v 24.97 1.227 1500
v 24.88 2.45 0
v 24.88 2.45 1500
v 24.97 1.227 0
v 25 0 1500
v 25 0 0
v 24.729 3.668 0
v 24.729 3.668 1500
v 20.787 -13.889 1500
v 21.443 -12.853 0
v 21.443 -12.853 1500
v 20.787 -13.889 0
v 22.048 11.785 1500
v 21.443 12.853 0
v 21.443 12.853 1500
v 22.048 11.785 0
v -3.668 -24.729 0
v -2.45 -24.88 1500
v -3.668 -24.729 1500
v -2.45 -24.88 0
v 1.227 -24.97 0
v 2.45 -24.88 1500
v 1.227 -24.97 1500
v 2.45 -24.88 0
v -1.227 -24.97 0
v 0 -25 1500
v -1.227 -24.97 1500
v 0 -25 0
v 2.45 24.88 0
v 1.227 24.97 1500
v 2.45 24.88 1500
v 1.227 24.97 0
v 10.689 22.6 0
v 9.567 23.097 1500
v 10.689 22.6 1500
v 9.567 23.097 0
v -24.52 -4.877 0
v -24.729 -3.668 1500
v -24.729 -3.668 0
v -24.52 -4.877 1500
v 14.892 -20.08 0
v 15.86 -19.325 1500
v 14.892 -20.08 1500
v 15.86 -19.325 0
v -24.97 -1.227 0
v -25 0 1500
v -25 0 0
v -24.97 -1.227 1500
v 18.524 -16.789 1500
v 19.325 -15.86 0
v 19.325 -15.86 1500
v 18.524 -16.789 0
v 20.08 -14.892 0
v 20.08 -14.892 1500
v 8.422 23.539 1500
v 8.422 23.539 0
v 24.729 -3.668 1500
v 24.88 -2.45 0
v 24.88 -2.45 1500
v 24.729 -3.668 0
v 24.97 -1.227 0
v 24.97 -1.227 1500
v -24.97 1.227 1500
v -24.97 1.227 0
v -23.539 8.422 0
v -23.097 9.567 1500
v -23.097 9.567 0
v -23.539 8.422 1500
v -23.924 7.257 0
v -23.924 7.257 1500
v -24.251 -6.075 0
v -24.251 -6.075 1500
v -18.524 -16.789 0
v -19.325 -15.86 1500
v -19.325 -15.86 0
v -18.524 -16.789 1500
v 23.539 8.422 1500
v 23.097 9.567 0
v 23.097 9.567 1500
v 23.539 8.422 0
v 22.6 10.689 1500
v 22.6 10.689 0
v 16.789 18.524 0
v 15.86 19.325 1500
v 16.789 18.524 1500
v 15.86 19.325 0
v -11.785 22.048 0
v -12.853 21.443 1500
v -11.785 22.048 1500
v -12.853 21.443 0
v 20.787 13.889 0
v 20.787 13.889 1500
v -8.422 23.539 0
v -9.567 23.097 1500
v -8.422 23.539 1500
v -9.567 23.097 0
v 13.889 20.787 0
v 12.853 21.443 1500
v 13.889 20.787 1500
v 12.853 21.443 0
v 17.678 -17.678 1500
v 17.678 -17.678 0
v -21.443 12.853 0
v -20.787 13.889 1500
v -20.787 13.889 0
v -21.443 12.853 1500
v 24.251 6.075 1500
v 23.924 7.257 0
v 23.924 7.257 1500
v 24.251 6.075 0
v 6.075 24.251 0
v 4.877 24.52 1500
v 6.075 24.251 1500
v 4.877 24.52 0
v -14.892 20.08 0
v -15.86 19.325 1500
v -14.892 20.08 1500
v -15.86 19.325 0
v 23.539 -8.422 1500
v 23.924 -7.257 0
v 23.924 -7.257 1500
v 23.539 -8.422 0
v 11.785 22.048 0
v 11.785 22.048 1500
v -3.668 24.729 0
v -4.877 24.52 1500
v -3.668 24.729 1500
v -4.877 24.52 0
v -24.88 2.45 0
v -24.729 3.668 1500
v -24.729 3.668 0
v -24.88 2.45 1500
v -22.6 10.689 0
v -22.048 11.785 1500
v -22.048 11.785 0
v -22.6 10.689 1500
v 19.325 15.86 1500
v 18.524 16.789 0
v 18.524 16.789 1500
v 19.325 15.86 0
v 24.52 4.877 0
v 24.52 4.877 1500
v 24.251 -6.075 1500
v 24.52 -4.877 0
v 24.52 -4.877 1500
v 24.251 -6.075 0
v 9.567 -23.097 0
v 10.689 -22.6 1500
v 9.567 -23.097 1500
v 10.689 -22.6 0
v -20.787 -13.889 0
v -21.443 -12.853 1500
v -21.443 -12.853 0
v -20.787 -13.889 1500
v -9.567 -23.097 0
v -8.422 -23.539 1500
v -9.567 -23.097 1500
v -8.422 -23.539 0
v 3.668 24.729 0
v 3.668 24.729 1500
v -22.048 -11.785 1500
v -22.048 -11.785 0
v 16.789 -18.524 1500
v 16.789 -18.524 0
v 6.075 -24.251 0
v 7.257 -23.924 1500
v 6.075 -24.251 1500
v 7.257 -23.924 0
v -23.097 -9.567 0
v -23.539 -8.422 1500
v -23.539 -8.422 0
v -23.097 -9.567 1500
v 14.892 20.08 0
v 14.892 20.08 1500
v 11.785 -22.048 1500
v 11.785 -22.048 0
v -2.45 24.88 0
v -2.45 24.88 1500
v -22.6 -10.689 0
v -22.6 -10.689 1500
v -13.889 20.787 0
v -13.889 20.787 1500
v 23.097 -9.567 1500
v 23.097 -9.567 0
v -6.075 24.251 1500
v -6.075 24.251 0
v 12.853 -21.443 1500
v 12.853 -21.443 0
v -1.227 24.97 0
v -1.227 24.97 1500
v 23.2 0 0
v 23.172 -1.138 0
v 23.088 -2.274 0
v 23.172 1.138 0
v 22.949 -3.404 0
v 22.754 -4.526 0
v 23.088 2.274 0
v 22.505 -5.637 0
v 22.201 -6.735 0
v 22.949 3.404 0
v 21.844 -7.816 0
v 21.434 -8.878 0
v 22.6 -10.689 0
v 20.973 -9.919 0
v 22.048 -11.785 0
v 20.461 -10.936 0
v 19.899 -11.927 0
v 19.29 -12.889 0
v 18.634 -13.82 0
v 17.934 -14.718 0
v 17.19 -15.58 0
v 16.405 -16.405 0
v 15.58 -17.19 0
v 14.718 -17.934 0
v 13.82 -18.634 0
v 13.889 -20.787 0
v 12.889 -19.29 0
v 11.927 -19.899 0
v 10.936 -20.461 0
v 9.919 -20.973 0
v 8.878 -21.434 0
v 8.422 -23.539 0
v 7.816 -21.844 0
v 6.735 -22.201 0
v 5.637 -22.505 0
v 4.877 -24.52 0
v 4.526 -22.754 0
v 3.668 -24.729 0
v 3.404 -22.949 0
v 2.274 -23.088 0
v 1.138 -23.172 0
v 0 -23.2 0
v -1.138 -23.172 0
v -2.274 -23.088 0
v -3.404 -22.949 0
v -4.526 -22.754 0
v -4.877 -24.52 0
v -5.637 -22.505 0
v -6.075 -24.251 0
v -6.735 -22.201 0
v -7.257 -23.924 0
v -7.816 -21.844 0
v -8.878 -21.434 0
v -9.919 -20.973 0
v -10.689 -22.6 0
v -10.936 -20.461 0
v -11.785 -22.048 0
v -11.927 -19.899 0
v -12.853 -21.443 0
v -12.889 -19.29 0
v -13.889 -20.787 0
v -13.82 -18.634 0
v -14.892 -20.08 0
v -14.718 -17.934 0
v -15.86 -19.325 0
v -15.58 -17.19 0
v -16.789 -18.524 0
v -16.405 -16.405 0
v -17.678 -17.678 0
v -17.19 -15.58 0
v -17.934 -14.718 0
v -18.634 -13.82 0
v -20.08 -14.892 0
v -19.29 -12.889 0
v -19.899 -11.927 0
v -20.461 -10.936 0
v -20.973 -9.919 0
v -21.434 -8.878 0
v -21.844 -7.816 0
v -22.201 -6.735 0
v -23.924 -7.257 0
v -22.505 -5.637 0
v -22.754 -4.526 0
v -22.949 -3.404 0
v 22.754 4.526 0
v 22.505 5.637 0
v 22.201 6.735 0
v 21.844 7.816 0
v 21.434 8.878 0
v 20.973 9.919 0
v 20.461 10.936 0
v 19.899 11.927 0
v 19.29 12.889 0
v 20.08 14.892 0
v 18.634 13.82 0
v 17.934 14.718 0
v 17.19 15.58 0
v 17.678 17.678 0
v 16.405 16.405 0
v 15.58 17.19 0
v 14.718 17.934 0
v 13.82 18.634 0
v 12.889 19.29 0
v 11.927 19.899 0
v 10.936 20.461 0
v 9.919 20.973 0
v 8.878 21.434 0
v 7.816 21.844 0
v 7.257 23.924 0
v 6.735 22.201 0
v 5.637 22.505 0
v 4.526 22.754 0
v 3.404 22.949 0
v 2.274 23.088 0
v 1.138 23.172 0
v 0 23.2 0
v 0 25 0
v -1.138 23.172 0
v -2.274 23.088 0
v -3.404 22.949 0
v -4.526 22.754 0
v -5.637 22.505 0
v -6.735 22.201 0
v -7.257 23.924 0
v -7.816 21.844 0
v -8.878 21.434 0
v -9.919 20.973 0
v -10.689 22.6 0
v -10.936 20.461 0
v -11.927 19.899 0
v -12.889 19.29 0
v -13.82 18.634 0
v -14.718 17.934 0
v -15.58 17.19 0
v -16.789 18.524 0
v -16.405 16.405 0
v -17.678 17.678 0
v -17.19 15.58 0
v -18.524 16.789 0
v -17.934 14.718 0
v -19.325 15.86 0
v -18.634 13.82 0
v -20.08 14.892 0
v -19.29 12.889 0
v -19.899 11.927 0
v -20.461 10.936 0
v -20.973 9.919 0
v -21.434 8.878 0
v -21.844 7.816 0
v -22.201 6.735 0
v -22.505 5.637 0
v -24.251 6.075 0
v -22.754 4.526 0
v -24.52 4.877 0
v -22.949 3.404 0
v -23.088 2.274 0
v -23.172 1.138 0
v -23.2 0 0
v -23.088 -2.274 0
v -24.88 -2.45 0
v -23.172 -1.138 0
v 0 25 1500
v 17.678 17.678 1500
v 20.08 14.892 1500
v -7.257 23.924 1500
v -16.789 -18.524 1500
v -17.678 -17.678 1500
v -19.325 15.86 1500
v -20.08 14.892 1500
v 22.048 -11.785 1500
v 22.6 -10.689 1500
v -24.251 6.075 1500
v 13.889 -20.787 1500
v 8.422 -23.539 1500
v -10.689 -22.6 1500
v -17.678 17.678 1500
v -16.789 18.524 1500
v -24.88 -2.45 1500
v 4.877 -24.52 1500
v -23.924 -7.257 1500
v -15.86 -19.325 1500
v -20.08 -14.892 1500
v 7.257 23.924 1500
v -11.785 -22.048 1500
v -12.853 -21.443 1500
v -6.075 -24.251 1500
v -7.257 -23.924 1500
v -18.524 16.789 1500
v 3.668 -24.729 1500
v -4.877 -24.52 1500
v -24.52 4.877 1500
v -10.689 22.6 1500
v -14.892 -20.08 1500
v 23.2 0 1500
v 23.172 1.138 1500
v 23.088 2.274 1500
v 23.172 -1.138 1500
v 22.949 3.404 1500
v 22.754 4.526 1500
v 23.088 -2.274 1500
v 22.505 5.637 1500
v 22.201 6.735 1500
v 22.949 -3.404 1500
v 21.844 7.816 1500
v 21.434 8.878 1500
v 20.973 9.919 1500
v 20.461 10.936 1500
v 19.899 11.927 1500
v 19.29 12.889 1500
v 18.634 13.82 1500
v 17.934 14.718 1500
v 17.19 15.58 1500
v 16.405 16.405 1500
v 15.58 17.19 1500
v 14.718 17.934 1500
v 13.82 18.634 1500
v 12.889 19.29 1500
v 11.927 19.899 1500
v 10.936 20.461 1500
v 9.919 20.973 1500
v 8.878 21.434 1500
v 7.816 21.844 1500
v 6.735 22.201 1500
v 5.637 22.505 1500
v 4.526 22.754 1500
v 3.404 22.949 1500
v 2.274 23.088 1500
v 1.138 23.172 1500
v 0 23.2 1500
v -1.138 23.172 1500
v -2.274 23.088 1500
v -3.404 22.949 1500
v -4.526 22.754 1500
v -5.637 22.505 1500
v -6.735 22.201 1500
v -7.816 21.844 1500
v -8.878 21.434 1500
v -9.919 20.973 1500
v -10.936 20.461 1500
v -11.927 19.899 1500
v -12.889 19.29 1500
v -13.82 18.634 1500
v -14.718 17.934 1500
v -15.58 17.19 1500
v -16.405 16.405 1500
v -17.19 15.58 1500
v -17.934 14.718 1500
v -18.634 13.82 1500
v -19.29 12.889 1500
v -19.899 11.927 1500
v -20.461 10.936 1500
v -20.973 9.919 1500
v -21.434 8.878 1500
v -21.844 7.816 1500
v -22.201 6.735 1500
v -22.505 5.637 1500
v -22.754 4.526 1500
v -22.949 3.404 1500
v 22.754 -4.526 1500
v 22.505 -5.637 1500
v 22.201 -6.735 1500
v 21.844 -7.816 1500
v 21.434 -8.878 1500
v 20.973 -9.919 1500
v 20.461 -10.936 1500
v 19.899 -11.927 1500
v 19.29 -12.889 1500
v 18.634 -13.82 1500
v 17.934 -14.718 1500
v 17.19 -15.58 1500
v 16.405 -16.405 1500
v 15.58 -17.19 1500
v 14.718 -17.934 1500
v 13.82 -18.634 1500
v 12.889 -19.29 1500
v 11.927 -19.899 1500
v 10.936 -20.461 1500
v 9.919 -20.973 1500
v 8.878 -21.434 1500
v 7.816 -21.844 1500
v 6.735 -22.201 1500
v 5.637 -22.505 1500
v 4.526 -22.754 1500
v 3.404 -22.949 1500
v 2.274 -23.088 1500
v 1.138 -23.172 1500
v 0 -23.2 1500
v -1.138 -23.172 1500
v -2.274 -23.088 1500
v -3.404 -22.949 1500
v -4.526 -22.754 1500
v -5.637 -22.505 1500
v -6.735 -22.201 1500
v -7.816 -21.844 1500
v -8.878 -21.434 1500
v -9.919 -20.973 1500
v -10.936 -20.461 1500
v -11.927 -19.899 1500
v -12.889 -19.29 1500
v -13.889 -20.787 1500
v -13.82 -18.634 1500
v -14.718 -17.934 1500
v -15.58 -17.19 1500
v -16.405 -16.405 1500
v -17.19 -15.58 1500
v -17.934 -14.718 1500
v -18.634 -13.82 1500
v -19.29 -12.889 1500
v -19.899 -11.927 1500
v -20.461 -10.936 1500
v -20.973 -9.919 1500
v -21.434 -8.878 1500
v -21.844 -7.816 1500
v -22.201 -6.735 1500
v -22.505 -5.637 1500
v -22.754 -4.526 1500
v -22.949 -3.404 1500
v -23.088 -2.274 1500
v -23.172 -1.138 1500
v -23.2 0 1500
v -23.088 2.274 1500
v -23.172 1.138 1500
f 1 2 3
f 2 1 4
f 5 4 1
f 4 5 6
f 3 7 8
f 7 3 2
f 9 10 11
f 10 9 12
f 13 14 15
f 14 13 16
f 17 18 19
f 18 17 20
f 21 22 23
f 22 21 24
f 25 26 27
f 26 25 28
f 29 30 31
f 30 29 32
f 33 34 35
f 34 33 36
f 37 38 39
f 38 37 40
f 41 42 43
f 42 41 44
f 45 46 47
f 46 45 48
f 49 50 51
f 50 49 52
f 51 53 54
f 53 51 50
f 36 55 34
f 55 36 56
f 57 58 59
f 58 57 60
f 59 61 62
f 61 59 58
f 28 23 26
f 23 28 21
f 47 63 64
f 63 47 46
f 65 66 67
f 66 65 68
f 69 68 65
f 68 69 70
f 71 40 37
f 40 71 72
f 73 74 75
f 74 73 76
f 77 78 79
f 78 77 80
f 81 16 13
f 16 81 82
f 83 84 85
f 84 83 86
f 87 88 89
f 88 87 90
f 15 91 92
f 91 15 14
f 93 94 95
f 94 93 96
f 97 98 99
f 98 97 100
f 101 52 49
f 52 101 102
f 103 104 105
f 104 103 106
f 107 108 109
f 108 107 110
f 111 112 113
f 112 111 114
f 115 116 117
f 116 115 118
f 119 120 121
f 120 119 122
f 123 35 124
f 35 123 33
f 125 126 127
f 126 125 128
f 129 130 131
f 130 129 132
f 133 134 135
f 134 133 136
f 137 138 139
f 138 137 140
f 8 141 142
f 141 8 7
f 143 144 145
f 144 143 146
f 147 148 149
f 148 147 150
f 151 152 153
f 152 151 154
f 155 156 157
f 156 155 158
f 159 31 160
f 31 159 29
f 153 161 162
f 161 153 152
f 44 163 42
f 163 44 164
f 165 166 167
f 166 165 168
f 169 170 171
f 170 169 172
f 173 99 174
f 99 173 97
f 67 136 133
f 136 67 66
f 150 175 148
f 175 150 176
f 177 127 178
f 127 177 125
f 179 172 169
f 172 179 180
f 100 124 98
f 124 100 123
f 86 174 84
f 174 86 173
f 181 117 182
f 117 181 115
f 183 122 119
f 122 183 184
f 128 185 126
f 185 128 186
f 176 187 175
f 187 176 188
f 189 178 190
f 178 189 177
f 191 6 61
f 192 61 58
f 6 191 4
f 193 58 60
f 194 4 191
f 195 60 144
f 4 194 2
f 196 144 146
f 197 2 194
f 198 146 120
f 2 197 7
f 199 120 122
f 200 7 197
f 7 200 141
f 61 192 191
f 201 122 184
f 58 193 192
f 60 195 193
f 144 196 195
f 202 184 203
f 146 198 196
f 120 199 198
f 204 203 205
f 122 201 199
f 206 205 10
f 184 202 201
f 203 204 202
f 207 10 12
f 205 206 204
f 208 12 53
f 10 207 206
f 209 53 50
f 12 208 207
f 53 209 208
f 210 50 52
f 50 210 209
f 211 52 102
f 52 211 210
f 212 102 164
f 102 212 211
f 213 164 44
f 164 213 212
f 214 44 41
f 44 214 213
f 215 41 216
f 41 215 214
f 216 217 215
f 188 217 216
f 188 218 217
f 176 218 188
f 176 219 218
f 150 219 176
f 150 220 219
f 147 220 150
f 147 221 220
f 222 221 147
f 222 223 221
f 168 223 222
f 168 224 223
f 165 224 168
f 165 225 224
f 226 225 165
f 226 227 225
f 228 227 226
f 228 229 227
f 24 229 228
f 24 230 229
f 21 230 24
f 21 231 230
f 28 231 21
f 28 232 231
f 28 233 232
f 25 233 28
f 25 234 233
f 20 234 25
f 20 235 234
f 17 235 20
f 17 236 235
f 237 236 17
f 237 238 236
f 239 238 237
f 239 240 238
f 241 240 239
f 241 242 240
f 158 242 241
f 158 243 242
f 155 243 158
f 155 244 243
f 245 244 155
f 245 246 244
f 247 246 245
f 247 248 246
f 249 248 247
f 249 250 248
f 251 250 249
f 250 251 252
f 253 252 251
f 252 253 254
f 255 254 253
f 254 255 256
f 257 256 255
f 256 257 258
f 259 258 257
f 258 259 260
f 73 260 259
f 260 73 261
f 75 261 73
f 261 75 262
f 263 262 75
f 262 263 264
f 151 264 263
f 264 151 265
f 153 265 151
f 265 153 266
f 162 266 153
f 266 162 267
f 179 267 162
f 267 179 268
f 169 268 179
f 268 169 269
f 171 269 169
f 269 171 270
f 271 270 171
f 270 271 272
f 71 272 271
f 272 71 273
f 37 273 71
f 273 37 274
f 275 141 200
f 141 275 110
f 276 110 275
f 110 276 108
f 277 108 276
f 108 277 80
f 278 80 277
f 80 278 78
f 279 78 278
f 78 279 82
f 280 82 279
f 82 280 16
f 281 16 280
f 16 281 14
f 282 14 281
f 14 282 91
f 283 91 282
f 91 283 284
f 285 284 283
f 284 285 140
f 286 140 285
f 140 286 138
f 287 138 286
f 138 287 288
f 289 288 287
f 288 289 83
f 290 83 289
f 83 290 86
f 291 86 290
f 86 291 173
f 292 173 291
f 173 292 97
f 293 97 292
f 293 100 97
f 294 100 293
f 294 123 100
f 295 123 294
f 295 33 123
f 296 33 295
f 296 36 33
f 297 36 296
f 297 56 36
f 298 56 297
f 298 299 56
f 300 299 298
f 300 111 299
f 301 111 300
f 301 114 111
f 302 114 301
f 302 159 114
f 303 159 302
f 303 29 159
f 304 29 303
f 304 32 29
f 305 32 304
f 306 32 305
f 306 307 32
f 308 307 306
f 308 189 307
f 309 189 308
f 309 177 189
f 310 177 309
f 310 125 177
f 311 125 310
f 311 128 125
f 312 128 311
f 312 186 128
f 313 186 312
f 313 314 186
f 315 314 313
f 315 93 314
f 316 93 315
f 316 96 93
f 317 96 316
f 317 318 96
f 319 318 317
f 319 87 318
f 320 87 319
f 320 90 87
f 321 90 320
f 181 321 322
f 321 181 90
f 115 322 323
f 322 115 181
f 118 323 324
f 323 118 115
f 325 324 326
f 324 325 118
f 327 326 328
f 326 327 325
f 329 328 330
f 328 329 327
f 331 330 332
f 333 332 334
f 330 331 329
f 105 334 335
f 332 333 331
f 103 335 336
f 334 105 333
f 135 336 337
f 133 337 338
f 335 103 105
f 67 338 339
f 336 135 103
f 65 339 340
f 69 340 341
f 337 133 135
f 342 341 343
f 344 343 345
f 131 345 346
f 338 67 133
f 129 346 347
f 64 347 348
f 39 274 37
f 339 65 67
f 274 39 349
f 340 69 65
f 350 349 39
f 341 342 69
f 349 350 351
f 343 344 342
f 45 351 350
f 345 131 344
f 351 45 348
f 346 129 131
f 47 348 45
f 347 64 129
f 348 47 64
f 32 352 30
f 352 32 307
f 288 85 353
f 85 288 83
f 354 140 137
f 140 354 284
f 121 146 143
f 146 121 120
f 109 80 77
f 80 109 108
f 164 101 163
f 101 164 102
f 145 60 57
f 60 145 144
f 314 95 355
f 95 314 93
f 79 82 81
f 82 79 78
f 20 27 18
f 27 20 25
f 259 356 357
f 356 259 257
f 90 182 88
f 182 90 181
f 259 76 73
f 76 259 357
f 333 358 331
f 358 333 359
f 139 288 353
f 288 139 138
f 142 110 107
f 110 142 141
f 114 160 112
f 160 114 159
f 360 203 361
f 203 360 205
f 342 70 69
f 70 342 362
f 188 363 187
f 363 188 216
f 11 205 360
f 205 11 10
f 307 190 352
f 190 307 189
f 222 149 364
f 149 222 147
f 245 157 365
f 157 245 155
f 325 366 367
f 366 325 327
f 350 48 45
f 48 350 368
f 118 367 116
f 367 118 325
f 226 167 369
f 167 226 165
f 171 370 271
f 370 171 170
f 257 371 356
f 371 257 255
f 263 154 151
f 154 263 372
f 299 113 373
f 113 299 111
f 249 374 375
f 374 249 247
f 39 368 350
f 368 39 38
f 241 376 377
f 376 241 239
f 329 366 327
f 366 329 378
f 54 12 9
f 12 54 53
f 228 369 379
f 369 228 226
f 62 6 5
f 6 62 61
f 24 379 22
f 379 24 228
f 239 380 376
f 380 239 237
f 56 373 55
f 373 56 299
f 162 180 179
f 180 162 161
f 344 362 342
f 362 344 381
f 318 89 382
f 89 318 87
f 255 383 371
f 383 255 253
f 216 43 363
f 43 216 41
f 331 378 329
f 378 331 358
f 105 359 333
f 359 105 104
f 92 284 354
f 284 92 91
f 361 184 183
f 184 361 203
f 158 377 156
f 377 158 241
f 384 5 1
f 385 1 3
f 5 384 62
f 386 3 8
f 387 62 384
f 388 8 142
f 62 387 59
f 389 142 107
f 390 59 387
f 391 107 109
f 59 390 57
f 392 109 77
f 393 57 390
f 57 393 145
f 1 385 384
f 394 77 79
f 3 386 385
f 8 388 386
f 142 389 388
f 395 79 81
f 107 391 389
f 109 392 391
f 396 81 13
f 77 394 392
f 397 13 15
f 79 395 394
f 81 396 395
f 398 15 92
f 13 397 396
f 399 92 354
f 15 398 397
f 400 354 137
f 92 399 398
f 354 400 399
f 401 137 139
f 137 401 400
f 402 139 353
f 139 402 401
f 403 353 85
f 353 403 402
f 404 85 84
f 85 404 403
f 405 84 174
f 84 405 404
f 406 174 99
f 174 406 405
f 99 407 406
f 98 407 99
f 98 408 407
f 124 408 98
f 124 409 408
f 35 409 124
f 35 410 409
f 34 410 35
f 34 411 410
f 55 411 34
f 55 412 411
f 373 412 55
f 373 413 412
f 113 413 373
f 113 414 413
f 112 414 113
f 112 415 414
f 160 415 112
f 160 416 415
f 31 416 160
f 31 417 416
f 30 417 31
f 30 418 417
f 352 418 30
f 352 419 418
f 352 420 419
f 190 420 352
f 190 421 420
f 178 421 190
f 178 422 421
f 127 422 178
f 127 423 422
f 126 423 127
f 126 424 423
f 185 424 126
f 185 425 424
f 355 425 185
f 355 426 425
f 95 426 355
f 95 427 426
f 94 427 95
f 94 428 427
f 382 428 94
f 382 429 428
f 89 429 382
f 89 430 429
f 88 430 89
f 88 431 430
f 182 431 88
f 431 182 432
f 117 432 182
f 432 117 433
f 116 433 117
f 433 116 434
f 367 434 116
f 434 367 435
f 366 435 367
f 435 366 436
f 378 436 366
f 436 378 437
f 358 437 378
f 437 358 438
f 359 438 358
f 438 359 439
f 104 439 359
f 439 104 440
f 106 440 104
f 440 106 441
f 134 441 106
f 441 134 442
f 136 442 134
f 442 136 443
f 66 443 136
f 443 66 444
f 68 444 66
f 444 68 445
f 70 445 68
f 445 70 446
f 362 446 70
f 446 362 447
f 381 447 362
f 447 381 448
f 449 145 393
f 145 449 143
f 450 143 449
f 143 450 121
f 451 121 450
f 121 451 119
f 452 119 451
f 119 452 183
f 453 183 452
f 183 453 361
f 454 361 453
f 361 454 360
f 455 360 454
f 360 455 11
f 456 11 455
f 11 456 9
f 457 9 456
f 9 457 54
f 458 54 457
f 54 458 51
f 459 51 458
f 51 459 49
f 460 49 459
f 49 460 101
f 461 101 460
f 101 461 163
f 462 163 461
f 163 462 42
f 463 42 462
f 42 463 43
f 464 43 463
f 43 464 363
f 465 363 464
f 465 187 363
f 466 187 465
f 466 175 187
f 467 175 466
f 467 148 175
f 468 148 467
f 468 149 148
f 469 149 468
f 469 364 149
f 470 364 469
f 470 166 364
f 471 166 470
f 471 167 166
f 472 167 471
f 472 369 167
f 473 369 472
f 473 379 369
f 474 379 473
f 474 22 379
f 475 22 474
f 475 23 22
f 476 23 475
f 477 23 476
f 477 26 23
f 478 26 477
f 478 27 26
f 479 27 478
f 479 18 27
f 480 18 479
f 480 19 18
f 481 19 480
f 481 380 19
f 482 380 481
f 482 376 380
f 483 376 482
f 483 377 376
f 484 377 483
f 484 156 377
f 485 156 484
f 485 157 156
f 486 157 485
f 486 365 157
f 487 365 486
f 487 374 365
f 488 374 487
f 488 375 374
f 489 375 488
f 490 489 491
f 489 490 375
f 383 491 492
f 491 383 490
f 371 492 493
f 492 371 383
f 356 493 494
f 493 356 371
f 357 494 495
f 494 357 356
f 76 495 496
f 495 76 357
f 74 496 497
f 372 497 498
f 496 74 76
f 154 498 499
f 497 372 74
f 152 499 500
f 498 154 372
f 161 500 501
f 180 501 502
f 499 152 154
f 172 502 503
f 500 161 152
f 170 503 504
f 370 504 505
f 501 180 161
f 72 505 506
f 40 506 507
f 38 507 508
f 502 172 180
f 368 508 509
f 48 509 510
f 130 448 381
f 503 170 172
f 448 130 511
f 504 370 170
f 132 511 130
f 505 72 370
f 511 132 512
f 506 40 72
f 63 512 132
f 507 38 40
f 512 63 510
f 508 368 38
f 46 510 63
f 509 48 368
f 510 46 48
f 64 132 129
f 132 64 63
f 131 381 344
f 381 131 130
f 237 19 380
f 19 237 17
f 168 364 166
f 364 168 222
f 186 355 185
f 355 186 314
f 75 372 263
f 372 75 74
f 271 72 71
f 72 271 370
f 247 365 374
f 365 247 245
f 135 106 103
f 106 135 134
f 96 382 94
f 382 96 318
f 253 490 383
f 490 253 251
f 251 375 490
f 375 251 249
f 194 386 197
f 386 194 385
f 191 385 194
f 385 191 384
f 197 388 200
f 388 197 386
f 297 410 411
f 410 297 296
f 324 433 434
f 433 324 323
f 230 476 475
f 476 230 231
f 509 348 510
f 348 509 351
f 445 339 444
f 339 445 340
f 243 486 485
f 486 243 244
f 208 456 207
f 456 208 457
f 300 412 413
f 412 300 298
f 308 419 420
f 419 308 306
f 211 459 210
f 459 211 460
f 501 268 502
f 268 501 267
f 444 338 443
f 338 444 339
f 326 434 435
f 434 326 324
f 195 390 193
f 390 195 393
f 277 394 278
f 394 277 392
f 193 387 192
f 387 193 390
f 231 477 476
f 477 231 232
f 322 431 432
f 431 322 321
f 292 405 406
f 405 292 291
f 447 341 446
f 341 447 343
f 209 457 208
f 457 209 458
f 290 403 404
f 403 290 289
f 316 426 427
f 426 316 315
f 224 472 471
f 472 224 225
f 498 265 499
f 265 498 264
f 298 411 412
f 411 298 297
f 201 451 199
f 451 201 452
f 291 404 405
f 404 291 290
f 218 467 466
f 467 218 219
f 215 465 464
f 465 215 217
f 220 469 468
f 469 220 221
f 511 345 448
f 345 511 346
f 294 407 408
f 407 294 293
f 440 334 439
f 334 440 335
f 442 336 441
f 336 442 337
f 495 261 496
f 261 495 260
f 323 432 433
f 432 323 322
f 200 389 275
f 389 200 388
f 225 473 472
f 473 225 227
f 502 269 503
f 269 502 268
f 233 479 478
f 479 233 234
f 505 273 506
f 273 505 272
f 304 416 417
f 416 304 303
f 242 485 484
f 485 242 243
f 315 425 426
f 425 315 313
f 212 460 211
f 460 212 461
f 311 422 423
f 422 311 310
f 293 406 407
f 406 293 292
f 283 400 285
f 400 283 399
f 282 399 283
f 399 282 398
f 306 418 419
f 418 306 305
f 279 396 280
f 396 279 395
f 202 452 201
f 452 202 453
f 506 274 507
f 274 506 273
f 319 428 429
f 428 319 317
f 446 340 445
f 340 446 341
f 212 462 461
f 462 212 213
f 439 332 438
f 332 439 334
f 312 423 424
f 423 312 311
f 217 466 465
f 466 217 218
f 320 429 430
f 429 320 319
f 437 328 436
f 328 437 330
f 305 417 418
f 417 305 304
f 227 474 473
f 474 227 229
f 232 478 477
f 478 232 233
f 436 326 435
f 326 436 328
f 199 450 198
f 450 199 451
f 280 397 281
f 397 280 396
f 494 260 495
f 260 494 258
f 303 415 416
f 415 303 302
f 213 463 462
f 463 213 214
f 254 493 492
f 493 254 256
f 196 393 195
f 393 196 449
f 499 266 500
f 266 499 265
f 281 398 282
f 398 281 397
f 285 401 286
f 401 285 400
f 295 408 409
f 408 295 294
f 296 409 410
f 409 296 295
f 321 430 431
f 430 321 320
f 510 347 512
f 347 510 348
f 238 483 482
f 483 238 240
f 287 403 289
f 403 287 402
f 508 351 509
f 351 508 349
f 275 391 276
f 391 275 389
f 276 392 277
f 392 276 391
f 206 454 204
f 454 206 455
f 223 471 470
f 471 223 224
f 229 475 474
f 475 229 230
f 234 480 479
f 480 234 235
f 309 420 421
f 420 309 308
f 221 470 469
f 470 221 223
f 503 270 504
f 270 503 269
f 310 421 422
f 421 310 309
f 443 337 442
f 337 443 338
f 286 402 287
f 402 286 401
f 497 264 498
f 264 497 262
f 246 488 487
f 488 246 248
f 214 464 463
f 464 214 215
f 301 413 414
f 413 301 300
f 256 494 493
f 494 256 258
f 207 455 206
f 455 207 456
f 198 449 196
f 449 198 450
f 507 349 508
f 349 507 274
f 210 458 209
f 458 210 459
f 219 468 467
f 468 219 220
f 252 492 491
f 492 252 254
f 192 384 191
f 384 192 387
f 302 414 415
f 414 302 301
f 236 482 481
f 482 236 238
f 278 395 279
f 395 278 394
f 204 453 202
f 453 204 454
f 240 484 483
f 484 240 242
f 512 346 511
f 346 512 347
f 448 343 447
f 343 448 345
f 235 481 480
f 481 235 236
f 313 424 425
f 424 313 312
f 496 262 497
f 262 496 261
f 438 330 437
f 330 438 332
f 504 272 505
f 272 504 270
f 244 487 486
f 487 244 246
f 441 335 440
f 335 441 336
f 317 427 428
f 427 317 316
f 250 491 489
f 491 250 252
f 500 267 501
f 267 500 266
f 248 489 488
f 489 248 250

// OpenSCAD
$fn = 128;

// HT 50 pipe (approx.): DN50, OD 50 mm, typical wall ~1.8 mm
// Length: 1500 mm

od = 50;          // outer diameter (mm)
wall = 1.8;       // wall thickness (mm)
id = od - 2*wall; // inner diameter (mm)
len = 1500;       // length (mm)

difference() {
  cylinder(h = len, d = od, center = false);
  translate([0,0,-0.5])
    cylinder(h = len + 1, d = id, center = false);
}
